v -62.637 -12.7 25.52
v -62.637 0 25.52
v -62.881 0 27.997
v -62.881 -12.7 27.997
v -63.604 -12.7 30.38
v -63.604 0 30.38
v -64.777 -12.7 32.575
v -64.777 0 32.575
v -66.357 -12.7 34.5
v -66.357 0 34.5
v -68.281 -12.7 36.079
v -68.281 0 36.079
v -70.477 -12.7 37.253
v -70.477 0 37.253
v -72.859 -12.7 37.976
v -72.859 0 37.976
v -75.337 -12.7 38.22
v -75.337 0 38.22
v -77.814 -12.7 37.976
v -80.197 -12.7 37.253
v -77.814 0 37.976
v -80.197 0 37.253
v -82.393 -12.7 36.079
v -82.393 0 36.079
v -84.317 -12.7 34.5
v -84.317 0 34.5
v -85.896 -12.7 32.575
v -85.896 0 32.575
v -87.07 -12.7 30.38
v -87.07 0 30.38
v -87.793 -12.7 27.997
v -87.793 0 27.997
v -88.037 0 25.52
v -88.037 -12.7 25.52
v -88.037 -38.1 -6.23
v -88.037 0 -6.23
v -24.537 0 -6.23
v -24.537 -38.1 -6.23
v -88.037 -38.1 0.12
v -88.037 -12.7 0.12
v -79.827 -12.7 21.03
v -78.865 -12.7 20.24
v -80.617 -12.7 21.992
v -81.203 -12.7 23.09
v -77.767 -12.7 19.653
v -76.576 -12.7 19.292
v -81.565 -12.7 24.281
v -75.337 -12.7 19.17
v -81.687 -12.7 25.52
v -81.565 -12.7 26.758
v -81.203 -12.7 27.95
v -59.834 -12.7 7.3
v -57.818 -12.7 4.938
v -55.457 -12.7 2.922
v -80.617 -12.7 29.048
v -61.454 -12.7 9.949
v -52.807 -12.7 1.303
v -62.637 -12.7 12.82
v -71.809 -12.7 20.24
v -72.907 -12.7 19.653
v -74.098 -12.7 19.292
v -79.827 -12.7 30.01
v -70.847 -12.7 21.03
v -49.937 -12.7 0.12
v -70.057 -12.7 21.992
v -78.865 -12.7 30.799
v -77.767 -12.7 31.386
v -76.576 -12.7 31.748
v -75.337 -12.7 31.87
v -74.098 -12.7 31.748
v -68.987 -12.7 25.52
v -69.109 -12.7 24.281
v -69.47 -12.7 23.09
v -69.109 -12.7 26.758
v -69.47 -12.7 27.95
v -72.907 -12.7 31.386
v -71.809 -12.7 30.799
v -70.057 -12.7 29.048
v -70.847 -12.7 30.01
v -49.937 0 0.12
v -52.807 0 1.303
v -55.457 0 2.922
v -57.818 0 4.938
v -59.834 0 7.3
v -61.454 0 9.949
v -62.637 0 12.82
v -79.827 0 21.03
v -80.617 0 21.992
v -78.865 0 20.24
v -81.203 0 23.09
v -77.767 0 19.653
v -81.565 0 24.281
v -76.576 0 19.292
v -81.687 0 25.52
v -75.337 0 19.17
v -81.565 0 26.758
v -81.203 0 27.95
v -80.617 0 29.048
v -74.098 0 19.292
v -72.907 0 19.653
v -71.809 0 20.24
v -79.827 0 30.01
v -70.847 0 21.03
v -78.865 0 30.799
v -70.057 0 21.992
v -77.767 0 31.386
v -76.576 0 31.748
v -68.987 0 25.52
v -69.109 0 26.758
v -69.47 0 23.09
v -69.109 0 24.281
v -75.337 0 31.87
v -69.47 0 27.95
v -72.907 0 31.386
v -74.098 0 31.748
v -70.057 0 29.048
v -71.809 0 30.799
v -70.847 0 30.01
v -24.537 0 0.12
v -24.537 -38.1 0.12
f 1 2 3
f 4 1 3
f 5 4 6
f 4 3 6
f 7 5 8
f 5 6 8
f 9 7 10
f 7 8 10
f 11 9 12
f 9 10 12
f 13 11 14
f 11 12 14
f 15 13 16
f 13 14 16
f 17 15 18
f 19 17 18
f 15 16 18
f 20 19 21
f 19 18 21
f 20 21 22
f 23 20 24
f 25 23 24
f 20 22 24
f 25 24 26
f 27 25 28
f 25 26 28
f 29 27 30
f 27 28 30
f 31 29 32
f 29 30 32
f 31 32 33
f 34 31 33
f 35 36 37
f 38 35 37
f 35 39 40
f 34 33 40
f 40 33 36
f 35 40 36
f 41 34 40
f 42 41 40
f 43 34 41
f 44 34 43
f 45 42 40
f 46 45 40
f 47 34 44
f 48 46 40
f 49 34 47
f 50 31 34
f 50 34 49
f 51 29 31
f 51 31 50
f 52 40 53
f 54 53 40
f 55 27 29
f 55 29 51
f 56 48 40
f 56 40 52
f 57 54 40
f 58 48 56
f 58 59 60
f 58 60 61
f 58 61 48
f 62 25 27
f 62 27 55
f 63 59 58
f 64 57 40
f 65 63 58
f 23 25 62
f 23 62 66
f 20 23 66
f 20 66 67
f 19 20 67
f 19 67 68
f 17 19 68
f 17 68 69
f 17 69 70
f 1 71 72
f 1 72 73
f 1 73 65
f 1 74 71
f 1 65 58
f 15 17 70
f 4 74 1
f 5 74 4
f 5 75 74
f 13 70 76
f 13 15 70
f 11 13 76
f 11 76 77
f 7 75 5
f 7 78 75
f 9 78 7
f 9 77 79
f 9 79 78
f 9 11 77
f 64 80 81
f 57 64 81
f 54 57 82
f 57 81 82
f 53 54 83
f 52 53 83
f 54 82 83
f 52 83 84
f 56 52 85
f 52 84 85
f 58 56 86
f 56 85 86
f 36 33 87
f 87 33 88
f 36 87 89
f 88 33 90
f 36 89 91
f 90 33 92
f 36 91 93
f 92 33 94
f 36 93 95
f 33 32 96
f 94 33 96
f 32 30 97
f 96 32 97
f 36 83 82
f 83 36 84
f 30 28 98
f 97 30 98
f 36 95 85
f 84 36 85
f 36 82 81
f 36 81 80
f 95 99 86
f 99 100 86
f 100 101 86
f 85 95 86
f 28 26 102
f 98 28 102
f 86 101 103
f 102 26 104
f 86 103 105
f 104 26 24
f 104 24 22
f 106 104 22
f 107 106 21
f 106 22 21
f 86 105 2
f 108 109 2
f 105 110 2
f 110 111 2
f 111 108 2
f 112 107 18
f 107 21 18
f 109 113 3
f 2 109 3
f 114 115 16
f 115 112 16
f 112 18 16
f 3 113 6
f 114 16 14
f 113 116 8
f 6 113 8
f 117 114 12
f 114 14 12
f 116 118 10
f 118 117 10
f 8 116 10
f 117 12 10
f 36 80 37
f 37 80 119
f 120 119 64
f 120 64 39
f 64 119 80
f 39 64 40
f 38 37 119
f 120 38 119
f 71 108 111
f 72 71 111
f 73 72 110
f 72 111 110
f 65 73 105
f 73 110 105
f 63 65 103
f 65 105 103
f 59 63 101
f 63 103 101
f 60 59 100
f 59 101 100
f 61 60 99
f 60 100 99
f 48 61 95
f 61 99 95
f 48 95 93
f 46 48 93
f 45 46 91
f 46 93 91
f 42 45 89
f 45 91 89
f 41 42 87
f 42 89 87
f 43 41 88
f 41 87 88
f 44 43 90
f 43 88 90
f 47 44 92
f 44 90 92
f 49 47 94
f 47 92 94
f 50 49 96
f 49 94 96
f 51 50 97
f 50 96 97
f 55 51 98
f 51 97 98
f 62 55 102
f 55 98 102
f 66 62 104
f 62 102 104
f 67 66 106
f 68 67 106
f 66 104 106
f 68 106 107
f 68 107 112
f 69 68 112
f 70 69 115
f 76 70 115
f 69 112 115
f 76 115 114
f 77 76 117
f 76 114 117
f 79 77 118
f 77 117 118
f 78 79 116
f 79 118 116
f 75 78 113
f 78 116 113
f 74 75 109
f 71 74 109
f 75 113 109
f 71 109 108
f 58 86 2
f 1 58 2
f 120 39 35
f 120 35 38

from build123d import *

# Parameters (mm, degrees)
F1_DEPTH = 12.7
F2_DEPTH = 12.7
F4_DEPTH = 25.4


with BuildPart() as f1:
    # F0 (on Front) → F1 (new body)
    with BuildSketch(Plane.XZ):
        with BuildLine():
            ThreePointArc((-62.636777, 25.519665), (-75.336777, 38.219665), (-88.036777, 25.519665))
            Line((-88.036777, 25.519665), (-81.686777, 25.519665))
            ThreePointArc((-81.686777, 25.519665), (-75.336777, 31.869665), (-68.986777, 25.519665))
            Line((-68.986777, 25.519665), (-62.636777, 25.519665))
        make_face()
        with BuildLine():
            Line((-81.686777, 25.519665), (-88.036777, 25.519665))
            Line((-88.036777, 25.519665), (-88.036777, -6.230335))
            Line((-88.036777, -6.230335), (-62.636777, -6.230335))
            Line((-62.636777, -6.230335), (-62.636777, 0.119665))
            Line((-62.636777, 0.119665), (-62.636777, 12.819665))
            Line((-62.636777, 12.819665), (-62.636777, 25.519665))
            Line((-62.636777, 25.519665), (-68.986777, 25.519665))
            ThreePointArc((-68.986777, 25.519665), (-75.336777, 19.169665), (-81.686777, 25.519665))
        make_face()
    extrude(amount=F1_DEPTH)

    # F0 (on Front) → F2 (join)
    with BuildSketch(Plane.XZ):
        with BuildLine():
            Line((-81.686777, 25.519665), (-88.036777, 25.519665))
            Line((-88.036777, 25.519665), (-88.036777, -6.230335))
            Line((-88.036777, -6.230335), (-62.636777, -6.230335))
            Line((-62.636777, -6.230335), (-62.636777, 0.119665))
            Line((-62.636777, 0.119665), (-62.636777, 12.819665))
            Line((-62.636777, 12.819665), (-62.636777, 25.519665))
            Line((-62.636777, 25.519665), (-68.986777, 25.519665))
            ThreePointArc((-68.986777, 25.519665), (-75.336777, 19.169665), (-81.686777, 25.519665))
        make_face()
        with BuildLine():
            ThreePointArc((-62.636777, 25.519665), (-75.336777, 38.219665), (-88.036777, 25.519665))
            Line((-88.036777, 25.519665), (-81.686777, 25.519665))
            ThreePointArc((-81.686777, 25.519665), (-75.336777, 31.869665), (-68.986777, 25.519665))
            Line((-68.986777, 25.519665), (-62.636777, 25.519665))
        make_face()
        Polygon((-62.636777, 0.119665), (-62.636777, -6.230335), (-24.536777, -6.230335), (-24.536777, 0.119665), (-49.936777, 0.119665), align=None)
        with BuildLine():
            ThreePointArc((-49.936777, 0.119665), (-57.818406, 4.938036), (-62.636777, 12.819665))
            Line((-62.636777, 12.819665), (-62.636777, 0.119665))
            Line((-62.636777, 0.119665), (-49.936777, 0.119665))
        make_face()
    extrude(amount=F2_DEPTH)

    # F3 (on face) → F4 (join)
    with BuildSketch(Plane.XZ.offset(12.7)):
        Polygon((-24.536777, -6.230335), (-24.536777, 0.119665), (-49.936777, 0.119665), (-88.036777, 0.119665), (-88.036777, -6.230335), align=None)
    extrude(amount=F4_DEPTH)


solid = f1.part
